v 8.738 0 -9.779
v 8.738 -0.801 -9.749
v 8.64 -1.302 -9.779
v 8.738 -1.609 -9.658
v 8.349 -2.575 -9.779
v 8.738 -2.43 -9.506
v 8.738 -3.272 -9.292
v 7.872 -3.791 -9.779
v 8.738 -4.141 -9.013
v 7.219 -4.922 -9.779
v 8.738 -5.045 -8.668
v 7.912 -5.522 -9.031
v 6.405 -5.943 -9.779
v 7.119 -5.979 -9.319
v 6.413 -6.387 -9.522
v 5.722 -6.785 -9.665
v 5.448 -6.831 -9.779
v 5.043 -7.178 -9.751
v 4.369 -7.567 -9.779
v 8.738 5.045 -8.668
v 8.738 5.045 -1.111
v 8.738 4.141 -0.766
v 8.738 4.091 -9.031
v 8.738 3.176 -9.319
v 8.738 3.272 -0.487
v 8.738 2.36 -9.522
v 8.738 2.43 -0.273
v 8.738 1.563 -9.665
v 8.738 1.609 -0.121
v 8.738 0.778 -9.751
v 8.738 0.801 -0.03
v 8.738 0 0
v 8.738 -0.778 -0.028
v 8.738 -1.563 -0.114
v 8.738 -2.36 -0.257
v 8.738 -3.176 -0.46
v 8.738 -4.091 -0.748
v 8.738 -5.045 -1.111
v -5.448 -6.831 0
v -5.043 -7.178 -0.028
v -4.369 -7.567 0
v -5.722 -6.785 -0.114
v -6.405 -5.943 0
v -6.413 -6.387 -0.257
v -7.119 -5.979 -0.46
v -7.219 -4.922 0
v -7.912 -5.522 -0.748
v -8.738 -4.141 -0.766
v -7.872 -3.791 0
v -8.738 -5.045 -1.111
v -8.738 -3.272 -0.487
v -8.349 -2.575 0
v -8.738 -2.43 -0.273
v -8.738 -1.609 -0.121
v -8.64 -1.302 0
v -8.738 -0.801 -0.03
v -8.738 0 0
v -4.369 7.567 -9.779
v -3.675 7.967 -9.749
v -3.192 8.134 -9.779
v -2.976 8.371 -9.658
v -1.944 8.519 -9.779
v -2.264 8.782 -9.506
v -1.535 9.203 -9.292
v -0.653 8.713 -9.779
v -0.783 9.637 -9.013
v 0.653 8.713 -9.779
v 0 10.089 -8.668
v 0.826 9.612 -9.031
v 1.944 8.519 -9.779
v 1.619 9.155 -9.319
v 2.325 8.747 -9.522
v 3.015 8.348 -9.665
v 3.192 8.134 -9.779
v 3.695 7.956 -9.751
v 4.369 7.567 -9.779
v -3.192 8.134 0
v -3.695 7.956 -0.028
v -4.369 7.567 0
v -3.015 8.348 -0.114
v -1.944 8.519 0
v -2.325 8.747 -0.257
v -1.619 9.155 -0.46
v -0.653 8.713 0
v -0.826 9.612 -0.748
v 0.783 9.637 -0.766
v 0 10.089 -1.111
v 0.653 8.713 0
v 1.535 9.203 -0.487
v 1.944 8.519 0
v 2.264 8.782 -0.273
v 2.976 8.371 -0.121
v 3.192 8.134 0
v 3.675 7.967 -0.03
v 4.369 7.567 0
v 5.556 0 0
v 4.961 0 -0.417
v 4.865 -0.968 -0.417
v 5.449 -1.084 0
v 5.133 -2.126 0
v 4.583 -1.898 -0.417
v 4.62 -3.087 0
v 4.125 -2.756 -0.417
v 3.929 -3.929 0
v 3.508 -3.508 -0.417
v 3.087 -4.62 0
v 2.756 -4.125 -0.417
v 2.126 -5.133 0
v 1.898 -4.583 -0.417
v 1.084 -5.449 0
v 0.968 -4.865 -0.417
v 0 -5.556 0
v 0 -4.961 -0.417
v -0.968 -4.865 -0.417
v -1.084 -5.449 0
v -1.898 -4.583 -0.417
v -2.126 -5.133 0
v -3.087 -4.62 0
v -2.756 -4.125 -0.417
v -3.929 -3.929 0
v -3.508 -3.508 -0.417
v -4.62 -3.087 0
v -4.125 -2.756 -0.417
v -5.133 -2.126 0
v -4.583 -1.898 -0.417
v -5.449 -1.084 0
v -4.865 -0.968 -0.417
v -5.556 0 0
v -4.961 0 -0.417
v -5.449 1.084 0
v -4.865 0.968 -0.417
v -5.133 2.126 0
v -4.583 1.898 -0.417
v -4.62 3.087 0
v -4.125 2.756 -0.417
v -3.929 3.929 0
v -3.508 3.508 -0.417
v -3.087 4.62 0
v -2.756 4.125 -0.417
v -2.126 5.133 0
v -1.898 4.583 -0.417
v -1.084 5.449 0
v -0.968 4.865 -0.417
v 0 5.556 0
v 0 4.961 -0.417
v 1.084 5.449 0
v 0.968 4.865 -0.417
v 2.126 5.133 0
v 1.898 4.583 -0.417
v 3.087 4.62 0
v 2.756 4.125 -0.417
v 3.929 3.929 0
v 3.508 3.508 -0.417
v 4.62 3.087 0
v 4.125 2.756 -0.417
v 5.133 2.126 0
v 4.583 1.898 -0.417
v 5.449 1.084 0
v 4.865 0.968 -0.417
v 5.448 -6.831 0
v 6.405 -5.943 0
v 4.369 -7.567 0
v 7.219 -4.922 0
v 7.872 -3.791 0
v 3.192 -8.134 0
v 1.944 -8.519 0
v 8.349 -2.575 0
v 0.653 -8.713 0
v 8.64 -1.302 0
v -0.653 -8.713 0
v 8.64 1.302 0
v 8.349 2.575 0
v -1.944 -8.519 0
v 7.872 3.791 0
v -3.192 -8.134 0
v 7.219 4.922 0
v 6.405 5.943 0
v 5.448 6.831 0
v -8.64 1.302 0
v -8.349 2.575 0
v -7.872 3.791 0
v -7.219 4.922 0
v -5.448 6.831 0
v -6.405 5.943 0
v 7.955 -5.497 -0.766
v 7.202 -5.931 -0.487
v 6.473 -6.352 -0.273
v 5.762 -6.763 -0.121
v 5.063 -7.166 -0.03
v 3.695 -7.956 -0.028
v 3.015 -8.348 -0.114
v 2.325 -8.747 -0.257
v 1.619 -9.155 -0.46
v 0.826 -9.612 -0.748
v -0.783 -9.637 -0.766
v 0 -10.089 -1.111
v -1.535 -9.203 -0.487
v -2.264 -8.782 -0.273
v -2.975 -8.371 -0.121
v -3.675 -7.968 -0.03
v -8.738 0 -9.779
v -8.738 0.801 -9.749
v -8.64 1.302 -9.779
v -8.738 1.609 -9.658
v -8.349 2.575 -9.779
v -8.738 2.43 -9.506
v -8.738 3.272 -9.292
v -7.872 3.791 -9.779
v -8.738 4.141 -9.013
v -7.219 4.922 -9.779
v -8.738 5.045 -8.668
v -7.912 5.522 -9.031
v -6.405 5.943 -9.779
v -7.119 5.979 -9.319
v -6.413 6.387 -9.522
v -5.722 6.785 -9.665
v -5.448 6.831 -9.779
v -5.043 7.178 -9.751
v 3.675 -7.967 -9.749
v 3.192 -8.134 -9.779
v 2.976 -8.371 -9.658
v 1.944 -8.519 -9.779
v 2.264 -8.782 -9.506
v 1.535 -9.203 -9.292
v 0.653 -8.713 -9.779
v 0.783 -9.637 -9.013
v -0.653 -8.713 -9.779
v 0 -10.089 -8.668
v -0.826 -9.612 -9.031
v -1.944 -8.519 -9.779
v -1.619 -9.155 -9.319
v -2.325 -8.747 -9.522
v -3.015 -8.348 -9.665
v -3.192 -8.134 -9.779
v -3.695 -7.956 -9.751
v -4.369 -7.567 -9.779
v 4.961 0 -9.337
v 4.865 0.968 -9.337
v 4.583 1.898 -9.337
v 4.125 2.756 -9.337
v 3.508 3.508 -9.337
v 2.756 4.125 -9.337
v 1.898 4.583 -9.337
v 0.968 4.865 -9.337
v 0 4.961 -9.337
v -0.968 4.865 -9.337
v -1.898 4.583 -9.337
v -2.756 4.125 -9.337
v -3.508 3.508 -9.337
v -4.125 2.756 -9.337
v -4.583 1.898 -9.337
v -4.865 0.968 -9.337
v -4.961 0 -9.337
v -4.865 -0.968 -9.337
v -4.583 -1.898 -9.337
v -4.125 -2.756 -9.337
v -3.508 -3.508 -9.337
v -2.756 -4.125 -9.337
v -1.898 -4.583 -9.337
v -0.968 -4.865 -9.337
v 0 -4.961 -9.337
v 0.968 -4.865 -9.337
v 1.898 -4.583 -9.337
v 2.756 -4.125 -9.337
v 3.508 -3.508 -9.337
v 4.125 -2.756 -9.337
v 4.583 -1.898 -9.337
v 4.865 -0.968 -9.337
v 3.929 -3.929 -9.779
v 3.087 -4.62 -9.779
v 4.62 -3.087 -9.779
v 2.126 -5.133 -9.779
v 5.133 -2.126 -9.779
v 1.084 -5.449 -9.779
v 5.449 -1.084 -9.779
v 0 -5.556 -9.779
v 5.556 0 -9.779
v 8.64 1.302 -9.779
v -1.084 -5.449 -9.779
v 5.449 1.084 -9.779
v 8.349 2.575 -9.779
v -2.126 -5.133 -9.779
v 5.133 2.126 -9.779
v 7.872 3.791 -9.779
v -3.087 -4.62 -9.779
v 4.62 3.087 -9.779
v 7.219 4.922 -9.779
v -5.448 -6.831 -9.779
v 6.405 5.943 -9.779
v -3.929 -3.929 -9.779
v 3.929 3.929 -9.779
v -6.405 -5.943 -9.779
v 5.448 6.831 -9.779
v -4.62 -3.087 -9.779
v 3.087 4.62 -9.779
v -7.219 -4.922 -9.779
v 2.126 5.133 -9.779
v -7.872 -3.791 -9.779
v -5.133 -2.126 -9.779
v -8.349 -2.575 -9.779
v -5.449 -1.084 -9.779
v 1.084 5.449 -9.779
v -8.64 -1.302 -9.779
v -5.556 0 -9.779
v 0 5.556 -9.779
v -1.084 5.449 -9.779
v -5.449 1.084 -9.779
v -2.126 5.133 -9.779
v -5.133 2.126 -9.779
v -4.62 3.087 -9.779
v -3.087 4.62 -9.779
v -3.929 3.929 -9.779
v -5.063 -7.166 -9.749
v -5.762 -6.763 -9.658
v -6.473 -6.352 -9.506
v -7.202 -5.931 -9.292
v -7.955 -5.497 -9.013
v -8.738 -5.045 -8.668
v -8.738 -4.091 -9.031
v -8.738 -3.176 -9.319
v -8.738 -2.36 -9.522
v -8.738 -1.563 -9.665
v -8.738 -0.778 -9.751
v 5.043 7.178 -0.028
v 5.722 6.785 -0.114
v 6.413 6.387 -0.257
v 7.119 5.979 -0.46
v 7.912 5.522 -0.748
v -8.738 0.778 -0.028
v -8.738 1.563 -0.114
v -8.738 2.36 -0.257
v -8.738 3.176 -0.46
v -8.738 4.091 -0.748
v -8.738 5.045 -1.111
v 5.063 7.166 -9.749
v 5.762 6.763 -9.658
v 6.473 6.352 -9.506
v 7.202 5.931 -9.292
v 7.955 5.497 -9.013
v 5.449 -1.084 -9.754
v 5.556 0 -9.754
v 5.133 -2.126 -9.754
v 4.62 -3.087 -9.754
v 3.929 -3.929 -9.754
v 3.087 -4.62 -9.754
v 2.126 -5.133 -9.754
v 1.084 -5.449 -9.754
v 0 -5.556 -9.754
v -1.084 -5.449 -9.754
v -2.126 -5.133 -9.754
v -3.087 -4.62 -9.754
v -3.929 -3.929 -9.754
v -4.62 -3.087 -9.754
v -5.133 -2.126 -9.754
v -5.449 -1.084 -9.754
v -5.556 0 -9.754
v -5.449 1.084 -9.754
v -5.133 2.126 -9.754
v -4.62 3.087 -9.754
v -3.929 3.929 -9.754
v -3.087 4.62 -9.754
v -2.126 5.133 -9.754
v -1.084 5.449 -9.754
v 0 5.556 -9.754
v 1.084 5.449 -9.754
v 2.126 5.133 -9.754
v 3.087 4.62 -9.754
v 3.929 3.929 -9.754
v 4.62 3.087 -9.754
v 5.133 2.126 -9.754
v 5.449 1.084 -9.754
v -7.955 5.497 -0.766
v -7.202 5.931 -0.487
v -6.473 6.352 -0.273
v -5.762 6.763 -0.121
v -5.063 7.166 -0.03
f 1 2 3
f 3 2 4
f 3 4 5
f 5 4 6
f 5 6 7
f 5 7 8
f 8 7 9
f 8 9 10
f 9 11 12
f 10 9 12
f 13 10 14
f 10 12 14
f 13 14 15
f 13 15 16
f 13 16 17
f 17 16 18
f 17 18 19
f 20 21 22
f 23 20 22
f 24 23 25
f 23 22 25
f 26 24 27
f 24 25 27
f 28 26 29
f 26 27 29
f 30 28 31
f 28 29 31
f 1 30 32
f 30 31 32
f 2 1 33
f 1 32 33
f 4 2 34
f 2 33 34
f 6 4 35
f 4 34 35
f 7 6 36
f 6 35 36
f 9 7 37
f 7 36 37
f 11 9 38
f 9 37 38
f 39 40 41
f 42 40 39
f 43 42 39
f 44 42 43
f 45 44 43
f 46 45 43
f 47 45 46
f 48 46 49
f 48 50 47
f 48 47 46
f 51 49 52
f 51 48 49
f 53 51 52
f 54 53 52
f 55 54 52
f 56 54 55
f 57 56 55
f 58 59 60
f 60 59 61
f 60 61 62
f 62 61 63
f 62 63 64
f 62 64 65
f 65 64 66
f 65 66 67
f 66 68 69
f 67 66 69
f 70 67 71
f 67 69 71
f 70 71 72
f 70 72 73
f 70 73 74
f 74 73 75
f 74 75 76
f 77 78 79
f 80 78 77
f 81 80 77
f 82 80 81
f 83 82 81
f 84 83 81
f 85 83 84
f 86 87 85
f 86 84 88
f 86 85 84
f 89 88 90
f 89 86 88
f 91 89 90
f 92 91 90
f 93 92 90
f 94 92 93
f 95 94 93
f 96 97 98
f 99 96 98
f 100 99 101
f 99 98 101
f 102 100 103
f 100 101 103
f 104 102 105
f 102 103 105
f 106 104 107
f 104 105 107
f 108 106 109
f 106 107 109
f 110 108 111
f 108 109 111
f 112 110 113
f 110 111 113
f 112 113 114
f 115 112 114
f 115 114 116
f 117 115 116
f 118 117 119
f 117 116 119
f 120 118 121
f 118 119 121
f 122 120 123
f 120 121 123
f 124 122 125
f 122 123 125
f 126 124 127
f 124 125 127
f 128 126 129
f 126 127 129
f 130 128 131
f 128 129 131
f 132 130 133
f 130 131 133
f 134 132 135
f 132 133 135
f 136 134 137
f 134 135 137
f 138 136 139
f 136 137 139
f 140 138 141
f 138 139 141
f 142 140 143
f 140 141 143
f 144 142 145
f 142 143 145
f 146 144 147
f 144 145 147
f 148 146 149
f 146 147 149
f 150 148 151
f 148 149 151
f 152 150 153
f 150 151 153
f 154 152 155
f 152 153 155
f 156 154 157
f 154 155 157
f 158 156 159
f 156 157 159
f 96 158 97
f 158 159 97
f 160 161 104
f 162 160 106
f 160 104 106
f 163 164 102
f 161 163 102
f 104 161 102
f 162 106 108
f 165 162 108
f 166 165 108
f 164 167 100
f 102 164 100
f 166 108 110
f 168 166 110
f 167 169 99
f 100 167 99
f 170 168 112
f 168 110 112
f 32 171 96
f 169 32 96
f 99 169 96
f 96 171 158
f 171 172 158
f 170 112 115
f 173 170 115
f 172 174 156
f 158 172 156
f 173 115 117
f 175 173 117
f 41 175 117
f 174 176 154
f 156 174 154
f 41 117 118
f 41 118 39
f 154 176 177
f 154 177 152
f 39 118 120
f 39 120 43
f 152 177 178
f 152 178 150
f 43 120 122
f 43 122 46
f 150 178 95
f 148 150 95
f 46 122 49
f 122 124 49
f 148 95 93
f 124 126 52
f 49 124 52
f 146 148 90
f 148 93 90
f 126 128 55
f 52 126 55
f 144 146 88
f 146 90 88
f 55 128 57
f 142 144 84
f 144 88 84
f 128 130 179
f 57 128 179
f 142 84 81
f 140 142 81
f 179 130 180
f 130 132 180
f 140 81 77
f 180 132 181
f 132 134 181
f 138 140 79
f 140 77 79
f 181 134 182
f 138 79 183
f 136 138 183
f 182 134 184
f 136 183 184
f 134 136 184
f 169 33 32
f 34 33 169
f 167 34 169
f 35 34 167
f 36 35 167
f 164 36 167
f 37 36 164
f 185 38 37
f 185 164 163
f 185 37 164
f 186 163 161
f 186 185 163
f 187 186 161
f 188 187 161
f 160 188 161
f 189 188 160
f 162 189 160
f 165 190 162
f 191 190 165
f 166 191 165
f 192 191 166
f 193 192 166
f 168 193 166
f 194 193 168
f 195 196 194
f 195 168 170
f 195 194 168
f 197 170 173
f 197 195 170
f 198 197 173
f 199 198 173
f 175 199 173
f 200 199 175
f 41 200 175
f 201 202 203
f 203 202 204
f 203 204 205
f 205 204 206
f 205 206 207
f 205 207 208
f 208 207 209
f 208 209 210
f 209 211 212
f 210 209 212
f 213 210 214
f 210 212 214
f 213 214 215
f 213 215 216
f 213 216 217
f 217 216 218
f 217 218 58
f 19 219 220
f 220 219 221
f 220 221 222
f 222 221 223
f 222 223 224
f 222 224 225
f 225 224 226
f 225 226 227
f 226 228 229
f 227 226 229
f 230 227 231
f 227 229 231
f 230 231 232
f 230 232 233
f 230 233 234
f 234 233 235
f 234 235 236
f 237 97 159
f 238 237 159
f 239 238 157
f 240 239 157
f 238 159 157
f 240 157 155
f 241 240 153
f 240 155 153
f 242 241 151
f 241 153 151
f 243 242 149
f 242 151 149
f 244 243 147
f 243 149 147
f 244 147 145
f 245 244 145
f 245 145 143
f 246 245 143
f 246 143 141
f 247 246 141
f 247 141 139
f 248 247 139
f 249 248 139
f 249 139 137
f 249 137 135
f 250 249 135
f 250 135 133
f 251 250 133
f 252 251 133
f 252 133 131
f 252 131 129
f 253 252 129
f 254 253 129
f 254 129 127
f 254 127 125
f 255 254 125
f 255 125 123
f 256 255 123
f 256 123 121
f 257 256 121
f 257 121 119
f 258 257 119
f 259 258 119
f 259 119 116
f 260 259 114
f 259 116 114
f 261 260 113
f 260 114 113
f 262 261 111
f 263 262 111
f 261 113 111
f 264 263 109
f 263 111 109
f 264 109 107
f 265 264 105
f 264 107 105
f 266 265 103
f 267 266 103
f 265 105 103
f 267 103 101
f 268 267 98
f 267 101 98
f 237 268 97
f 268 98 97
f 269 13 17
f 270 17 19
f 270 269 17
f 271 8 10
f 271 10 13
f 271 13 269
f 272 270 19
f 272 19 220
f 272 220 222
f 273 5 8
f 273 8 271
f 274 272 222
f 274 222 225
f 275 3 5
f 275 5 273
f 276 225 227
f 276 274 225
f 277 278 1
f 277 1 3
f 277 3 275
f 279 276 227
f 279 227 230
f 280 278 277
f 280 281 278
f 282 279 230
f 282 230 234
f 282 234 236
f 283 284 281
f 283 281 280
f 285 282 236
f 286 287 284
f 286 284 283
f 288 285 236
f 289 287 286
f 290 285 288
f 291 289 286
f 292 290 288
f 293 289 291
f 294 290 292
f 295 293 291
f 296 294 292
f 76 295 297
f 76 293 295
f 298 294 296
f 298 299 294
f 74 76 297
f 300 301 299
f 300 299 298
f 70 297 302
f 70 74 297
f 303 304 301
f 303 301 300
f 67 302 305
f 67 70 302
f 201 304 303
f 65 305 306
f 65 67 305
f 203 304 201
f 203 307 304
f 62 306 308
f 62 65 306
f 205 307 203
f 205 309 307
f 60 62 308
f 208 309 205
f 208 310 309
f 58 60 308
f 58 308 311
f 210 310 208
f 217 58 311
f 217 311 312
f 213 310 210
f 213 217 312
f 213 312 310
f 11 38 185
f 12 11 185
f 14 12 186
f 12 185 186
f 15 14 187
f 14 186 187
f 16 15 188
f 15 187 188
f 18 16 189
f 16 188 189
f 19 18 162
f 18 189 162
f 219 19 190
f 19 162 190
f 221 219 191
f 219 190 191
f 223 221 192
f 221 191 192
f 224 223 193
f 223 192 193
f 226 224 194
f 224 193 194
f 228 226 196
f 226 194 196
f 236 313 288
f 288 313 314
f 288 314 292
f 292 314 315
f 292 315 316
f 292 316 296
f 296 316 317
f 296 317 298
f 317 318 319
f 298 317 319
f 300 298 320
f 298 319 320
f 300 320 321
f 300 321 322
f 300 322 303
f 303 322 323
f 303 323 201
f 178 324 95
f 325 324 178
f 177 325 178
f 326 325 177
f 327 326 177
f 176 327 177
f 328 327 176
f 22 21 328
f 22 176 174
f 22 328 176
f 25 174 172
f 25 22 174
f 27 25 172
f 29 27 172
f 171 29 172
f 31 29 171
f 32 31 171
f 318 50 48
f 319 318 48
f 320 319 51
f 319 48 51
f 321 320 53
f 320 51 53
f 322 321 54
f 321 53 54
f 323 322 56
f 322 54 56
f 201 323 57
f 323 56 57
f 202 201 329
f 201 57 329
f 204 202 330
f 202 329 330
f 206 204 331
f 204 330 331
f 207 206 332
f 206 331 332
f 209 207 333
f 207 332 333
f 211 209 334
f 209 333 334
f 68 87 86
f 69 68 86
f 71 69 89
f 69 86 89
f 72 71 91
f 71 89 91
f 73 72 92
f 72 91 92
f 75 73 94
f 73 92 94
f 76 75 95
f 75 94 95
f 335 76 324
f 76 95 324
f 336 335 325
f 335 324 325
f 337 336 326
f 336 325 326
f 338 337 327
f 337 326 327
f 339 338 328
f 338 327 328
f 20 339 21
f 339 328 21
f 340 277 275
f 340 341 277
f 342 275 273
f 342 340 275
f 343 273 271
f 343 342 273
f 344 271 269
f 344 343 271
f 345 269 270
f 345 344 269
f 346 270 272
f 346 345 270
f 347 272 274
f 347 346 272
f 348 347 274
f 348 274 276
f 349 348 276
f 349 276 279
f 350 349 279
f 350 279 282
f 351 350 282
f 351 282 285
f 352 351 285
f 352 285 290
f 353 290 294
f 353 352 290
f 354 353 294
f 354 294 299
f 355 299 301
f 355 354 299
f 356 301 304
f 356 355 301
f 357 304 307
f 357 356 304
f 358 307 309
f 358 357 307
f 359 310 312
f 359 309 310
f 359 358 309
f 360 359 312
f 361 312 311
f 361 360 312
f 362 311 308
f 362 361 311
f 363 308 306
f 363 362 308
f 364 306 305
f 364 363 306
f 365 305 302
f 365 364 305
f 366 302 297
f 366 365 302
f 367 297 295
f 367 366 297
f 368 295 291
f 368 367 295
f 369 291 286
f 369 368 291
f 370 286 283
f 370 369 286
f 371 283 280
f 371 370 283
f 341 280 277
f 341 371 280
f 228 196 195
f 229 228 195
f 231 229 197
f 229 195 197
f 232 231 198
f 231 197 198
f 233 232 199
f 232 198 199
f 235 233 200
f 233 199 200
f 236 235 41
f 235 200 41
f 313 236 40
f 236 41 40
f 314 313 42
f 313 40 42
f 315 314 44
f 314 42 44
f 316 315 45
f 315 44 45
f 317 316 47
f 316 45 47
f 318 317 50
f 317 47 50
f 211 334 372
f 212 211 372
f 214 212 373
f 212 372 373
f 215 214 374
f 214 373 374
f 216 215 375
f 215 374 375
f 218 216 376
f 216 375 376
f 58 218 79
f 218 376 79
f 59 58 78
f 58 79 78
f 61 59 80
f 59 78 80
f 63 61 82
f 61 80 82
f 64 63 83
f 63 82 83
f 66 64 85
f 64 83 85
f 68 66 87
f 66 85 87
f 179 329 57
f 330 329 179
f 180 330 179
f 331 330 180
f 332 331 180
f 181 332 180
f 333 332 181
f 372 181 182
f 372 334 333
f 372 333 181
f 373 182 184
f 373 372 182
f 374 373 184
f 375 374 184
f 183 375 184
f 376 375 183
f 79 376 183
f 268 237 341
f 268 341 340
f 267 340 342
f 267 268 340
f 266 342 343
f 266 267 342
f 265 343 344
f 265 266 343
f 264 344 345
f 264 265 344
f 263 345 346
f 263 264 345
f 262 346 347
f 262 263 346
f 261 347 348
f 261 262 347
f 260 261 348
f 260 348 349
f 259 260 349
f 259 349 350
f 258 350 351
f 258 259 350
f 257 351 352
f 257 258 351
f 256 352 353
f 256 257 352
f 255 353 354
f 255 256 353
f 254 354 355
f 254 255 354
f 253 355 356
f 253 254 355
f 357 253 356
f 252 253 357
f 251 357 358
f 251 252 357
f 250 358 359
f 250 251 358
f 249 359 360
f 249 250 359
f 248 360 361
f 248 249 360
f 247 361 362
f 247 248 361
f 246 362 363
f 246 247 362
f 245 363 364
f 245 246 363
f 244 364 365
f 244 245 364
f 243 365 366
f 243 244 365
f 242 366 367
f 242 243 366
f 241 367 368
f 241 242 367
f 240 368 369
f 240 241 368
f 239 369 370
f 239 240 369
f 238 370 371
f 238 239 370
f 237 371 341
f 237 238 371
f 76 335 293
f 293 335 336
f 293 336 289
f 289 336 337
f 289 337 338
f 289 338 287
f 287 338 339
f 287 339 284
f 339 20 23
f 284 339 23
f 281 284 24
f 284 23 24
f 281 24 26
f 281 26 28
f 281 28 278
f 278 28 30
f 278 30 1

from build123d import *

# Parameters (mm, degrees)
BASENUTSKE_R  = 4.96062
BASENUT_DEPTH = 9.779


with BuildPart() as part:
    # BaseNutSke → BaseNut (new body)
    with BuildSketch(Plane.XY):
        Polygon((8.7376, 5.044655712), (8.7376, -5.044655712), (0, -10.089311424), (-8.7376, -5.044655712), (-8.7376, 5.044655712), (0, 10.089311424), align=None)
        Circle(BASENUTSKE_R, mode=Mode.SUBTRACT)
    extrude(amount=-BASENUT_DEPTH)

    # Sketch3 → Double-Chamfer (revolve, cut)
    with BuildSketch(Plane(origin=(0, 0, 0), x_dir=(0, 0, -1), z_dir=(1, 0, 0))):
        Polygon((9.779, 8.7376), (8.66775, 10.089311424), (8.66775, 22.789311424), (22.479, 22.789311424), (22.479, 8.7376), align=None)
        Polygon((1.11125, 22.789311424), (-12.7, 22.789311424), (-12.7, 8.7376), (0, 8.7376), (1.11125, 10.089311424), align=None)
    revolve(axis=Axis((0, 0, 0), (0, 0, -1)), mode=Mode.SUBTRACT)

    # Sketch5 → EndChamfer (revolve, cut)
    with BuildSketch(Plane(origin=(0, 0, 0), x_dir=(0, 0, -1), z_dir=(1, 0, 0)), mode=Mode.PRIVATE) as endchamfer_sk:
        Polygon((9.7536, 5.55625), (9.294828922, 4.901057), (9.8044, 4.901057), (9.8044, 5.55625), align=None)
        Polygon((-0.0508, 5.55625), (0, 5.55625), (0.458771078, 4.901057), (-0.0508, 4.901057), align=None)
    revolve(endchamfer_sk.sketch.rotate(Axis((0, 0, -25.037505729), (0, 0, -1)), 90), axis=Axis((0, 0, -25.037505729), (0, 0, -1)), mode=Mode.SUBTRACT)


solid = part.part
